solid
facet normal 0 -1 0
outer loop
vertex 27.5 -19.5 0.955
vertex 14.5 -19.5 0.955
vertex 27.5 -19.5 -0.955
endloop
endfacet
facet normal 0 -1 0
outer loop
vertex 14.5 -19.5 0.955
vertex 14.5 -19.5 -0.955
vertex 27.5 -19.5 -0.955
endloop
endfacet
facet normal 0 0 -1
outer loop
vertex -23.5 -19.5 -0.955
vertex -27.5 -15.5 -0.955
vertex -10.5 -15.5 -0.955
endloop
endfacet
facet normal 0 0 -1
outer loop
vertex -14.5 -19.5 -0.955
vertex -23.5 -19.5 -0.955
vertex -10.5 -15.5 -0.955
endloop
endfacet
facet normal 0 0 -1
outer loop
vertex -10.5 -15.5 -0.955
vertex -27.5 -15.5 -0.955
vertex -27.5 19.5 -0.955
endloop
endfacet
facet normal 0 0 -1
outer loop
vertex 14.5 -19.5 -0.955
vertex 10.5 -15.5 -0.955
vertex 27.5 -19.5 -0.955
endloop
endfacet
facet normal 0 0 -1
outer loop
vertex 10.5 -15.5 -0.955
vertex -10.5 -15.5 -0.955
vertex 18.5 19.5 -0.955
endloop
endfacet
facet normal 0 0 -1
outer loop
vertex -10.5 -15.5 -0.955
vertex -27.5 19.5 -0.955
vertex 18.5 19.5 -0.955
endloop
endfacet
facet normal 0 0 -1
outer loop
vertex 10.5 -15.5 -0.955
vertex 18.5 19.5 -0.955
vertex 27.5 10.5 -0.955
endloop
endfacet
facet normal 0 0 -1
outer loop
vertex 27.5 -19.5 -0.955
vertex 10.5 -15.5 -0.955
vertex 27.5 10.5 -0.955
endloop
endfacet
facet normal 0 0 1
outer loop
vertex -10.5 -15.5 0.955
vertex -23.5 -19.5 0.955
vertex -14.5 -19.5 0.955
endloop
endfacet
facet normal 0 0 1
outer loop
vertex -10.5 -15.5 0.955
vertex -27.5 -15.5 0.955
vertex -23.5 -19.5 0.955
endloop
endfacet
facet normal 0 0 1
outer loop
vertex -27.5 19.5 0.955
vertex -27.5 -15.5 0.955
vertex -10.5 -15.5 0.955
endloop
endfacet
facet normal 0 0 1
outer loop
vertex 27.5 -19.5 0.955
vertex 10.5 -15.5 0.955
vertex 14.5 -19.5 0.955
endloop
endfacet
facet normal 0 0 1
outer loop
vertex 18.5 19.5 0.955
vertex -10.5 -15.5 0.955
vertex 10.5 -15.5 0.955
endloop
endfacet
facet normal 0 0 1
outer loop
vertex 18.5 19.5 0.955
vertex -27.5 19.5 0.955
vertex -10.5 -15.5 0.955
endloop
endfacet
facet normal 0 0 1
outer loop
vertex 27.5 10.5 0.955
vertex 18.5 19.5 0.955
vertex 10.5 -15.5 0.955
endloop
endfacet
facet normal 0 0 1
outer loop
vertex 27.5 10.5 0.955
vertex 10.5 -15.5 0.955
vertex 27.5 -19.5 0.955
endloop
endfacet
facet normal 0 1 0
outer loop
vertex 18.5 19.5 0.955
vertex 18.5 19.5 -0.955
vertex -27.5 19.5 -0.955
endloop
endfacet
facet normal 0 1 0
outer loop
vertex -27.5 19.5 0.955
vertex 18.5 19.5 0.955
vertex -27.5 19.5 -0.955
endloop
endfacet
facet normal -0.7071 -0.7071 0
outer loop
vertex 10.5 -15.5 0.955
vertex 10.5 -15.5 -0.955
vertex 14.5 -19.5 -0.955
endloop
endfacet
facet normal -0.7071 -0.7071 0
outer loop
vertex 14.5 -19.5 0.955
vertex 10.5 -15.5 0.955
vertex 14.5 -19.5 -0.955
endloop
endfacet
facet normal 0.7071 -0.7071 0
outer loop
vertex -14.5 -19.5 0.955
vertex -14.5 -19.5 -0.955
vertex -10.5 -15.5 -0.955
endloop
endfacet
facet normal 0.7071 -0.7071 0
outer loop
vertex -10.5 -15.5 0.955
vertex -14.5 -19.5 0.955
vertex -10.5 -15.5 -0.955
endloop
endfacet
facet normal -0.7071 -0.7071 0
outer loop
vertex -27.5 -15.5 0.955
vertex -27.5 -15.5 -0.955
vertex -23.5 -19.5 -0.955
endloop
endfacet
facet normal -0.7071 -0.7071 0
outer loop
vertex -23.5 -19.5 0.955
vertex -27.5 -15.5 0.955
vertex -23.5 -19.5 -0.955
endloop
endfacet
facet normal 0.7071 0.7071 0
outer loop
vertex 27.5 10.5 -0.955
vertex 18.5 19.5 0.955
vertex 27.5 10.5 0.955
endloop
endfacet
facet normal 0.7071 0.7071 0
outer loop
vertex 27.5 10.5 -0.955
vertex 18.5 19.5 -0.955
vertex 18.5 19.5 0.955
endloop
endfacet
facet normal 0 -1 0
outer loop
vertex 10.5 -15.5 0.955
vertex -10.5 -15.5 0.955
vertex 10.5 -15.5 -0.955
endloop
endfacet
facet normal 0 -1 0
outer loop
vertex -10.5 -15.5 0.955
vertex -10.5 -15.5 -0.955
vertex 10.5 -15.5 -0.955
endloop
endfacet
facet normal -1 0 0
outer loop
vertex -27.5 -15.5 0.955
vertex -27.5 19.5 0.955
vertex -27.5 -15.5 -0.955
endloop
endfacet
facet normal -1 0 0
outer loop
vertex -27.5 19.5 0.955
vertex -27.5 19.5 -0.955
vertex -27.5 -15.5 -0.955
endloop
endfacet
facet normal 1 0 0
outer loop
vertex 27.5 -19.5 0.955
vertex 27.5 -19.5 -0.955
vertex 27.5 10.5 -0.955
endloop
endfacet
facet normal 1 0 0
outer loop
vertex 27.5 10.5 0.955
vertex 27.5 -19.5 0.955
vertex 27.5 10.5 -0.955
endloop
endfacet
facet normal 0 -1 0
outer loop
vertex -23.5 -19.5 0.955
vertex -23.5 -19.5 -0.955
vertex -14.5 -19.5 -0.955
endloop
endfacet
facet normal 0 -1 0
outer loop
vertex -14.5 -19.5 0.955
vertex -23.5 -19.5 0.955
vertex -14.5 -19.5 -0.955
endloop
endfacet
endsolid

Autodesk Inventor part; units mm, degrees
ref_plane "YZ Plane" through (0, 0, 0) normal (1, 0, 0) x (0, 1, 0)
ref_plane "XZ Plane" through (0, 0, 0) normal (0, 1, 0) x (-1, 0, 0)
ref_plane "XY Plane" through (0, 0, 0) normal (0, 0, 1) x (1, 0, 0)
sketch "Sketch1" plane through (0, 0, 0) normal (0, 0, 1) x (1, 0, 0)
  line L0 (-23.5, -19.5) -> (27.5, -19.5)
  line L1 (27.5, -19.5) -> (27.5, 10.5)
  line L2 (18.5, 19.5) -> (-27.5, 19.5)
  line L3 (-27.5, 19.5) -> (-27.5, -15.5)
  line L4 (-27.5, -19.5) -> (27.5, 19.5) construction
  line L5 (27.5, -19.5) -> (-27.5, 19.5) construction
  line L6 (18.5, 19.5) -> (27.5, 10.5)
  line L7 (-27.5, -15.5) -> (-23.5, -19.5)
  line L8 (-14.5, -19.5) -> (-10.5, -15.5)
  line L9 (-10.5, -15.5) -> (10.5, -15.5)
  line L10 (10.5, -15.5) -> (14.5, -19.5)
  point P0 (0, 0)
  dimension "d0" = 55
  dimension "d1" = 39
  dimension "d2" = 9
  dimension "d3" = 9
  dimension "d4" = 4
  dimension "d5" = 4
  dimension "d11" = 17
  dimension "d12" = 17
extrude "Extrusion1" add sketch "Sketch1" along normal mid plane 1.91 contours L7 L3 L2 L6 L1 L0 L10 L9 L8
equation "\"d3\" = d2"
equation "\"d4\" = d5"
equation "\"d12\" = d11"
properties part number "Game_TurmoilPolicy"
